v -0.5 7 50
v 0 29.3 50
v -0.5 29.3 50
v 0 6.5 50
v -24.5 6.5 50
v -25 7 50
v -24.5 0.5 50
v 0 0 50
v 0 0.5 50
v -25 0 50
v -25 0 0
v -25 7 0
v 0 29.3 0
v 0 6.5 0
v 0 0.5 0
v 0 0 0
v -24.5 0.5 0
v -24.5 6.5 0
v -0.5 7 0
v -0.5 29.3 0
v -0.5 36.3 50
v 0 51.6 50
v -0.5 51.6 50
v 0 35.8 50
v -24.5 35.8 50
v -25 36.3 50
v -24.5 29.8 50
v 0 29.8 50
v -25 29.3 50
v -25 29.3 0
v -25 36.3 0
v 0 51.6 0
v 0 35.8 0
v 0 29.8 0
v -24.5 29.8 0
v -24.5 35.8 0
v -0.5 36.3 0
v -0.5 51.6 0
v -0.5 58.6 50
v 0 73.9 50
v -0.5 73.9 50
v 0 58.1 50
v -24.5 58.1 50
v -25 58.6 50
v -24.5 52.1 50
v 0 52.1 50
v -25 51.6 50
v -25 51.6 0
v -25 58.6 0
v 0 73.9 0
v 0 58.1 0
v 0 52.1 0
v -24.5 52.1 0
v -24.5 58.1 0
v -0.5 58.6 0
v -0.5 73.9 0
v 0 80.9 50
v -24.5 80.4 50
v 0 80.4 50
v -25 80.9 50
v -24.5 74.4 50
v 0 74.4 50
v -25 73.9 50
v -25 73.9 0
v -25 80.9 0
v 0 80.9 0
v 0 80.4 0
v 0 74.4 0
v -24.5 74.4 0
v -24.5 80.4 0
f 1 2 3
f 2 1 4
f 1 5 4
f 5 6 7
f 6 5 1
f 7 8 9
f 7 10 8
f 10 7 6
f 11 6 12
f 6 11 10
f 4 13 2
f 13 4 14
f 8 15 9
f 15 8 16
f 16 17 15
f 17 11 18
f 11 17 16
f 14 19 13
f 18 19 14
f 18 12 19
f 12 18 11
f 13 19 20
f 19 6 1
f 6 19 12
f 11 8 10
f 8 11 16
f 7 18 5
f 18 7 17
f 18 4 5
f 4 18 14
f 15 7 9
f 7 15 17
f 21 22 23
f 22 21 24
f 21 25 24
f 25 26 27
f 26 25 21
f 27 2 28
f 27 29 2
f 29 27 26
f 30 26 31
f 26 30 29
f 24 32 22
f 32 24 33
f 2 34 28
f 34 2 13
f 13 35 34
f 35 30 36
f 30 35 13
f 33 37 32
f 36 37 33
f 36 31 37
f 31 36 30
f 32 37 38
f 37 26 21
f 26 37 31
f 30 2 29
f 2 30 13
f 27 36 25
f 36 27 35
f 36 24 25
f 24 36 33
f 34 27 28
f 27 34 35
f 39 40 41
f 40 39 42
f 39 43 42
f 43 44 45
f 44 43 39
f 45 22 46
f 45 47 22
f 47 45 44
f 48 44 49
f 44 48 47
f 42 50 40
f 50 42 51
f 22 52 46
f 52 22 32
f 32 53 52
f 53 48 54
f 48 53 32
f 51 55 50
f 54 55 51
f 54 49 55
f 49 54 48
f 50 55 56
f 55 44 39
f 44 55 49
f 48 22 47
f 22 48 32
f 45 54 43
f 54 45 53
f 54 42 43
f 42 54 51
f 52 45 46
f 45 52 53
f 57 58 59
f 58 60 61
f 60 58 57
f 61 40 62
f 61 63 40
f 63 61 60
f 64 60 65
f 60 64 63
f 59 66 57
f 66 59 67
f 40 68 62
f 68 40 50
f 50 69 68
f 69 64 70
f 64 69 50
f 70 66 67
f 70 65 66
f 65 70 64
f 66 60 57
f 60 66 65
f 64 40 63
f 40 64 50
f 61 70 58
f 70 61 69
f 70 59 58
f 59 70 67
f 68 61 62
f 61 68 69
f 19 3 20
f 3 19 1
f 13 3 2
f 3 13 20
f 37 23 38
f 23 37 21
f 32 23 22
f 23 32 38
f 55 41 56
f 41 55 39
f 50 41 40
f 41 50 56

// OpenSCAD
rotate([0,-90,0])
   complex(
      clears=[22.3,15.3,15.3],
      bridges= 7,
      height=25,
      deep = 50,
      walls = 0.5
   );



//module 
module complex(
   bridges= 10,
   height=20,
   deep = 50,
   walls = 0.5,
   clears=[15,15,15,15]
   ) {   
   howmany = len(clears)-1;
   union() {
       for (j = [0:  howmany]) {
           // bridge position
          mv = (bridges * j) + (sumv(clears,j) - clears[j]);
          
          // Move bridge to it's position 
           translate([0,mv,0])
           bridge(deep=deep,
               width=bridges, 
               height=height, 
               walls=walls);
           
           // Move clearing after the last bridge
            translate([0,  mv + bridges ,0])
               cube([deep, clears[j], walls]);
          
          // When last need to add an extra bridge
          if (j==howmany) {
            translate([0,mv + bridges + clears[j],0])
              bridge(deep=deep,
                  width=bridges, 
                  height=height, 
                  walls=walls);
          }
       }
   }
}


module bridge(deep, width, height, walls) {
    difference(){
        cube([deep,width, height]);
        translate([-1,walls,-1])
        cube([deep+2, 
            width -(walls*2),
            height+1-walls]);
    }
}


// sumv function by https://www.thingiverse.com/MichaelAtOz/about
// https://www.thingiverse.com/thing:70745
function sumv(v,i,s=0) = (i==s ? v[i] : v[i] + sumv(v,i-1,s));
